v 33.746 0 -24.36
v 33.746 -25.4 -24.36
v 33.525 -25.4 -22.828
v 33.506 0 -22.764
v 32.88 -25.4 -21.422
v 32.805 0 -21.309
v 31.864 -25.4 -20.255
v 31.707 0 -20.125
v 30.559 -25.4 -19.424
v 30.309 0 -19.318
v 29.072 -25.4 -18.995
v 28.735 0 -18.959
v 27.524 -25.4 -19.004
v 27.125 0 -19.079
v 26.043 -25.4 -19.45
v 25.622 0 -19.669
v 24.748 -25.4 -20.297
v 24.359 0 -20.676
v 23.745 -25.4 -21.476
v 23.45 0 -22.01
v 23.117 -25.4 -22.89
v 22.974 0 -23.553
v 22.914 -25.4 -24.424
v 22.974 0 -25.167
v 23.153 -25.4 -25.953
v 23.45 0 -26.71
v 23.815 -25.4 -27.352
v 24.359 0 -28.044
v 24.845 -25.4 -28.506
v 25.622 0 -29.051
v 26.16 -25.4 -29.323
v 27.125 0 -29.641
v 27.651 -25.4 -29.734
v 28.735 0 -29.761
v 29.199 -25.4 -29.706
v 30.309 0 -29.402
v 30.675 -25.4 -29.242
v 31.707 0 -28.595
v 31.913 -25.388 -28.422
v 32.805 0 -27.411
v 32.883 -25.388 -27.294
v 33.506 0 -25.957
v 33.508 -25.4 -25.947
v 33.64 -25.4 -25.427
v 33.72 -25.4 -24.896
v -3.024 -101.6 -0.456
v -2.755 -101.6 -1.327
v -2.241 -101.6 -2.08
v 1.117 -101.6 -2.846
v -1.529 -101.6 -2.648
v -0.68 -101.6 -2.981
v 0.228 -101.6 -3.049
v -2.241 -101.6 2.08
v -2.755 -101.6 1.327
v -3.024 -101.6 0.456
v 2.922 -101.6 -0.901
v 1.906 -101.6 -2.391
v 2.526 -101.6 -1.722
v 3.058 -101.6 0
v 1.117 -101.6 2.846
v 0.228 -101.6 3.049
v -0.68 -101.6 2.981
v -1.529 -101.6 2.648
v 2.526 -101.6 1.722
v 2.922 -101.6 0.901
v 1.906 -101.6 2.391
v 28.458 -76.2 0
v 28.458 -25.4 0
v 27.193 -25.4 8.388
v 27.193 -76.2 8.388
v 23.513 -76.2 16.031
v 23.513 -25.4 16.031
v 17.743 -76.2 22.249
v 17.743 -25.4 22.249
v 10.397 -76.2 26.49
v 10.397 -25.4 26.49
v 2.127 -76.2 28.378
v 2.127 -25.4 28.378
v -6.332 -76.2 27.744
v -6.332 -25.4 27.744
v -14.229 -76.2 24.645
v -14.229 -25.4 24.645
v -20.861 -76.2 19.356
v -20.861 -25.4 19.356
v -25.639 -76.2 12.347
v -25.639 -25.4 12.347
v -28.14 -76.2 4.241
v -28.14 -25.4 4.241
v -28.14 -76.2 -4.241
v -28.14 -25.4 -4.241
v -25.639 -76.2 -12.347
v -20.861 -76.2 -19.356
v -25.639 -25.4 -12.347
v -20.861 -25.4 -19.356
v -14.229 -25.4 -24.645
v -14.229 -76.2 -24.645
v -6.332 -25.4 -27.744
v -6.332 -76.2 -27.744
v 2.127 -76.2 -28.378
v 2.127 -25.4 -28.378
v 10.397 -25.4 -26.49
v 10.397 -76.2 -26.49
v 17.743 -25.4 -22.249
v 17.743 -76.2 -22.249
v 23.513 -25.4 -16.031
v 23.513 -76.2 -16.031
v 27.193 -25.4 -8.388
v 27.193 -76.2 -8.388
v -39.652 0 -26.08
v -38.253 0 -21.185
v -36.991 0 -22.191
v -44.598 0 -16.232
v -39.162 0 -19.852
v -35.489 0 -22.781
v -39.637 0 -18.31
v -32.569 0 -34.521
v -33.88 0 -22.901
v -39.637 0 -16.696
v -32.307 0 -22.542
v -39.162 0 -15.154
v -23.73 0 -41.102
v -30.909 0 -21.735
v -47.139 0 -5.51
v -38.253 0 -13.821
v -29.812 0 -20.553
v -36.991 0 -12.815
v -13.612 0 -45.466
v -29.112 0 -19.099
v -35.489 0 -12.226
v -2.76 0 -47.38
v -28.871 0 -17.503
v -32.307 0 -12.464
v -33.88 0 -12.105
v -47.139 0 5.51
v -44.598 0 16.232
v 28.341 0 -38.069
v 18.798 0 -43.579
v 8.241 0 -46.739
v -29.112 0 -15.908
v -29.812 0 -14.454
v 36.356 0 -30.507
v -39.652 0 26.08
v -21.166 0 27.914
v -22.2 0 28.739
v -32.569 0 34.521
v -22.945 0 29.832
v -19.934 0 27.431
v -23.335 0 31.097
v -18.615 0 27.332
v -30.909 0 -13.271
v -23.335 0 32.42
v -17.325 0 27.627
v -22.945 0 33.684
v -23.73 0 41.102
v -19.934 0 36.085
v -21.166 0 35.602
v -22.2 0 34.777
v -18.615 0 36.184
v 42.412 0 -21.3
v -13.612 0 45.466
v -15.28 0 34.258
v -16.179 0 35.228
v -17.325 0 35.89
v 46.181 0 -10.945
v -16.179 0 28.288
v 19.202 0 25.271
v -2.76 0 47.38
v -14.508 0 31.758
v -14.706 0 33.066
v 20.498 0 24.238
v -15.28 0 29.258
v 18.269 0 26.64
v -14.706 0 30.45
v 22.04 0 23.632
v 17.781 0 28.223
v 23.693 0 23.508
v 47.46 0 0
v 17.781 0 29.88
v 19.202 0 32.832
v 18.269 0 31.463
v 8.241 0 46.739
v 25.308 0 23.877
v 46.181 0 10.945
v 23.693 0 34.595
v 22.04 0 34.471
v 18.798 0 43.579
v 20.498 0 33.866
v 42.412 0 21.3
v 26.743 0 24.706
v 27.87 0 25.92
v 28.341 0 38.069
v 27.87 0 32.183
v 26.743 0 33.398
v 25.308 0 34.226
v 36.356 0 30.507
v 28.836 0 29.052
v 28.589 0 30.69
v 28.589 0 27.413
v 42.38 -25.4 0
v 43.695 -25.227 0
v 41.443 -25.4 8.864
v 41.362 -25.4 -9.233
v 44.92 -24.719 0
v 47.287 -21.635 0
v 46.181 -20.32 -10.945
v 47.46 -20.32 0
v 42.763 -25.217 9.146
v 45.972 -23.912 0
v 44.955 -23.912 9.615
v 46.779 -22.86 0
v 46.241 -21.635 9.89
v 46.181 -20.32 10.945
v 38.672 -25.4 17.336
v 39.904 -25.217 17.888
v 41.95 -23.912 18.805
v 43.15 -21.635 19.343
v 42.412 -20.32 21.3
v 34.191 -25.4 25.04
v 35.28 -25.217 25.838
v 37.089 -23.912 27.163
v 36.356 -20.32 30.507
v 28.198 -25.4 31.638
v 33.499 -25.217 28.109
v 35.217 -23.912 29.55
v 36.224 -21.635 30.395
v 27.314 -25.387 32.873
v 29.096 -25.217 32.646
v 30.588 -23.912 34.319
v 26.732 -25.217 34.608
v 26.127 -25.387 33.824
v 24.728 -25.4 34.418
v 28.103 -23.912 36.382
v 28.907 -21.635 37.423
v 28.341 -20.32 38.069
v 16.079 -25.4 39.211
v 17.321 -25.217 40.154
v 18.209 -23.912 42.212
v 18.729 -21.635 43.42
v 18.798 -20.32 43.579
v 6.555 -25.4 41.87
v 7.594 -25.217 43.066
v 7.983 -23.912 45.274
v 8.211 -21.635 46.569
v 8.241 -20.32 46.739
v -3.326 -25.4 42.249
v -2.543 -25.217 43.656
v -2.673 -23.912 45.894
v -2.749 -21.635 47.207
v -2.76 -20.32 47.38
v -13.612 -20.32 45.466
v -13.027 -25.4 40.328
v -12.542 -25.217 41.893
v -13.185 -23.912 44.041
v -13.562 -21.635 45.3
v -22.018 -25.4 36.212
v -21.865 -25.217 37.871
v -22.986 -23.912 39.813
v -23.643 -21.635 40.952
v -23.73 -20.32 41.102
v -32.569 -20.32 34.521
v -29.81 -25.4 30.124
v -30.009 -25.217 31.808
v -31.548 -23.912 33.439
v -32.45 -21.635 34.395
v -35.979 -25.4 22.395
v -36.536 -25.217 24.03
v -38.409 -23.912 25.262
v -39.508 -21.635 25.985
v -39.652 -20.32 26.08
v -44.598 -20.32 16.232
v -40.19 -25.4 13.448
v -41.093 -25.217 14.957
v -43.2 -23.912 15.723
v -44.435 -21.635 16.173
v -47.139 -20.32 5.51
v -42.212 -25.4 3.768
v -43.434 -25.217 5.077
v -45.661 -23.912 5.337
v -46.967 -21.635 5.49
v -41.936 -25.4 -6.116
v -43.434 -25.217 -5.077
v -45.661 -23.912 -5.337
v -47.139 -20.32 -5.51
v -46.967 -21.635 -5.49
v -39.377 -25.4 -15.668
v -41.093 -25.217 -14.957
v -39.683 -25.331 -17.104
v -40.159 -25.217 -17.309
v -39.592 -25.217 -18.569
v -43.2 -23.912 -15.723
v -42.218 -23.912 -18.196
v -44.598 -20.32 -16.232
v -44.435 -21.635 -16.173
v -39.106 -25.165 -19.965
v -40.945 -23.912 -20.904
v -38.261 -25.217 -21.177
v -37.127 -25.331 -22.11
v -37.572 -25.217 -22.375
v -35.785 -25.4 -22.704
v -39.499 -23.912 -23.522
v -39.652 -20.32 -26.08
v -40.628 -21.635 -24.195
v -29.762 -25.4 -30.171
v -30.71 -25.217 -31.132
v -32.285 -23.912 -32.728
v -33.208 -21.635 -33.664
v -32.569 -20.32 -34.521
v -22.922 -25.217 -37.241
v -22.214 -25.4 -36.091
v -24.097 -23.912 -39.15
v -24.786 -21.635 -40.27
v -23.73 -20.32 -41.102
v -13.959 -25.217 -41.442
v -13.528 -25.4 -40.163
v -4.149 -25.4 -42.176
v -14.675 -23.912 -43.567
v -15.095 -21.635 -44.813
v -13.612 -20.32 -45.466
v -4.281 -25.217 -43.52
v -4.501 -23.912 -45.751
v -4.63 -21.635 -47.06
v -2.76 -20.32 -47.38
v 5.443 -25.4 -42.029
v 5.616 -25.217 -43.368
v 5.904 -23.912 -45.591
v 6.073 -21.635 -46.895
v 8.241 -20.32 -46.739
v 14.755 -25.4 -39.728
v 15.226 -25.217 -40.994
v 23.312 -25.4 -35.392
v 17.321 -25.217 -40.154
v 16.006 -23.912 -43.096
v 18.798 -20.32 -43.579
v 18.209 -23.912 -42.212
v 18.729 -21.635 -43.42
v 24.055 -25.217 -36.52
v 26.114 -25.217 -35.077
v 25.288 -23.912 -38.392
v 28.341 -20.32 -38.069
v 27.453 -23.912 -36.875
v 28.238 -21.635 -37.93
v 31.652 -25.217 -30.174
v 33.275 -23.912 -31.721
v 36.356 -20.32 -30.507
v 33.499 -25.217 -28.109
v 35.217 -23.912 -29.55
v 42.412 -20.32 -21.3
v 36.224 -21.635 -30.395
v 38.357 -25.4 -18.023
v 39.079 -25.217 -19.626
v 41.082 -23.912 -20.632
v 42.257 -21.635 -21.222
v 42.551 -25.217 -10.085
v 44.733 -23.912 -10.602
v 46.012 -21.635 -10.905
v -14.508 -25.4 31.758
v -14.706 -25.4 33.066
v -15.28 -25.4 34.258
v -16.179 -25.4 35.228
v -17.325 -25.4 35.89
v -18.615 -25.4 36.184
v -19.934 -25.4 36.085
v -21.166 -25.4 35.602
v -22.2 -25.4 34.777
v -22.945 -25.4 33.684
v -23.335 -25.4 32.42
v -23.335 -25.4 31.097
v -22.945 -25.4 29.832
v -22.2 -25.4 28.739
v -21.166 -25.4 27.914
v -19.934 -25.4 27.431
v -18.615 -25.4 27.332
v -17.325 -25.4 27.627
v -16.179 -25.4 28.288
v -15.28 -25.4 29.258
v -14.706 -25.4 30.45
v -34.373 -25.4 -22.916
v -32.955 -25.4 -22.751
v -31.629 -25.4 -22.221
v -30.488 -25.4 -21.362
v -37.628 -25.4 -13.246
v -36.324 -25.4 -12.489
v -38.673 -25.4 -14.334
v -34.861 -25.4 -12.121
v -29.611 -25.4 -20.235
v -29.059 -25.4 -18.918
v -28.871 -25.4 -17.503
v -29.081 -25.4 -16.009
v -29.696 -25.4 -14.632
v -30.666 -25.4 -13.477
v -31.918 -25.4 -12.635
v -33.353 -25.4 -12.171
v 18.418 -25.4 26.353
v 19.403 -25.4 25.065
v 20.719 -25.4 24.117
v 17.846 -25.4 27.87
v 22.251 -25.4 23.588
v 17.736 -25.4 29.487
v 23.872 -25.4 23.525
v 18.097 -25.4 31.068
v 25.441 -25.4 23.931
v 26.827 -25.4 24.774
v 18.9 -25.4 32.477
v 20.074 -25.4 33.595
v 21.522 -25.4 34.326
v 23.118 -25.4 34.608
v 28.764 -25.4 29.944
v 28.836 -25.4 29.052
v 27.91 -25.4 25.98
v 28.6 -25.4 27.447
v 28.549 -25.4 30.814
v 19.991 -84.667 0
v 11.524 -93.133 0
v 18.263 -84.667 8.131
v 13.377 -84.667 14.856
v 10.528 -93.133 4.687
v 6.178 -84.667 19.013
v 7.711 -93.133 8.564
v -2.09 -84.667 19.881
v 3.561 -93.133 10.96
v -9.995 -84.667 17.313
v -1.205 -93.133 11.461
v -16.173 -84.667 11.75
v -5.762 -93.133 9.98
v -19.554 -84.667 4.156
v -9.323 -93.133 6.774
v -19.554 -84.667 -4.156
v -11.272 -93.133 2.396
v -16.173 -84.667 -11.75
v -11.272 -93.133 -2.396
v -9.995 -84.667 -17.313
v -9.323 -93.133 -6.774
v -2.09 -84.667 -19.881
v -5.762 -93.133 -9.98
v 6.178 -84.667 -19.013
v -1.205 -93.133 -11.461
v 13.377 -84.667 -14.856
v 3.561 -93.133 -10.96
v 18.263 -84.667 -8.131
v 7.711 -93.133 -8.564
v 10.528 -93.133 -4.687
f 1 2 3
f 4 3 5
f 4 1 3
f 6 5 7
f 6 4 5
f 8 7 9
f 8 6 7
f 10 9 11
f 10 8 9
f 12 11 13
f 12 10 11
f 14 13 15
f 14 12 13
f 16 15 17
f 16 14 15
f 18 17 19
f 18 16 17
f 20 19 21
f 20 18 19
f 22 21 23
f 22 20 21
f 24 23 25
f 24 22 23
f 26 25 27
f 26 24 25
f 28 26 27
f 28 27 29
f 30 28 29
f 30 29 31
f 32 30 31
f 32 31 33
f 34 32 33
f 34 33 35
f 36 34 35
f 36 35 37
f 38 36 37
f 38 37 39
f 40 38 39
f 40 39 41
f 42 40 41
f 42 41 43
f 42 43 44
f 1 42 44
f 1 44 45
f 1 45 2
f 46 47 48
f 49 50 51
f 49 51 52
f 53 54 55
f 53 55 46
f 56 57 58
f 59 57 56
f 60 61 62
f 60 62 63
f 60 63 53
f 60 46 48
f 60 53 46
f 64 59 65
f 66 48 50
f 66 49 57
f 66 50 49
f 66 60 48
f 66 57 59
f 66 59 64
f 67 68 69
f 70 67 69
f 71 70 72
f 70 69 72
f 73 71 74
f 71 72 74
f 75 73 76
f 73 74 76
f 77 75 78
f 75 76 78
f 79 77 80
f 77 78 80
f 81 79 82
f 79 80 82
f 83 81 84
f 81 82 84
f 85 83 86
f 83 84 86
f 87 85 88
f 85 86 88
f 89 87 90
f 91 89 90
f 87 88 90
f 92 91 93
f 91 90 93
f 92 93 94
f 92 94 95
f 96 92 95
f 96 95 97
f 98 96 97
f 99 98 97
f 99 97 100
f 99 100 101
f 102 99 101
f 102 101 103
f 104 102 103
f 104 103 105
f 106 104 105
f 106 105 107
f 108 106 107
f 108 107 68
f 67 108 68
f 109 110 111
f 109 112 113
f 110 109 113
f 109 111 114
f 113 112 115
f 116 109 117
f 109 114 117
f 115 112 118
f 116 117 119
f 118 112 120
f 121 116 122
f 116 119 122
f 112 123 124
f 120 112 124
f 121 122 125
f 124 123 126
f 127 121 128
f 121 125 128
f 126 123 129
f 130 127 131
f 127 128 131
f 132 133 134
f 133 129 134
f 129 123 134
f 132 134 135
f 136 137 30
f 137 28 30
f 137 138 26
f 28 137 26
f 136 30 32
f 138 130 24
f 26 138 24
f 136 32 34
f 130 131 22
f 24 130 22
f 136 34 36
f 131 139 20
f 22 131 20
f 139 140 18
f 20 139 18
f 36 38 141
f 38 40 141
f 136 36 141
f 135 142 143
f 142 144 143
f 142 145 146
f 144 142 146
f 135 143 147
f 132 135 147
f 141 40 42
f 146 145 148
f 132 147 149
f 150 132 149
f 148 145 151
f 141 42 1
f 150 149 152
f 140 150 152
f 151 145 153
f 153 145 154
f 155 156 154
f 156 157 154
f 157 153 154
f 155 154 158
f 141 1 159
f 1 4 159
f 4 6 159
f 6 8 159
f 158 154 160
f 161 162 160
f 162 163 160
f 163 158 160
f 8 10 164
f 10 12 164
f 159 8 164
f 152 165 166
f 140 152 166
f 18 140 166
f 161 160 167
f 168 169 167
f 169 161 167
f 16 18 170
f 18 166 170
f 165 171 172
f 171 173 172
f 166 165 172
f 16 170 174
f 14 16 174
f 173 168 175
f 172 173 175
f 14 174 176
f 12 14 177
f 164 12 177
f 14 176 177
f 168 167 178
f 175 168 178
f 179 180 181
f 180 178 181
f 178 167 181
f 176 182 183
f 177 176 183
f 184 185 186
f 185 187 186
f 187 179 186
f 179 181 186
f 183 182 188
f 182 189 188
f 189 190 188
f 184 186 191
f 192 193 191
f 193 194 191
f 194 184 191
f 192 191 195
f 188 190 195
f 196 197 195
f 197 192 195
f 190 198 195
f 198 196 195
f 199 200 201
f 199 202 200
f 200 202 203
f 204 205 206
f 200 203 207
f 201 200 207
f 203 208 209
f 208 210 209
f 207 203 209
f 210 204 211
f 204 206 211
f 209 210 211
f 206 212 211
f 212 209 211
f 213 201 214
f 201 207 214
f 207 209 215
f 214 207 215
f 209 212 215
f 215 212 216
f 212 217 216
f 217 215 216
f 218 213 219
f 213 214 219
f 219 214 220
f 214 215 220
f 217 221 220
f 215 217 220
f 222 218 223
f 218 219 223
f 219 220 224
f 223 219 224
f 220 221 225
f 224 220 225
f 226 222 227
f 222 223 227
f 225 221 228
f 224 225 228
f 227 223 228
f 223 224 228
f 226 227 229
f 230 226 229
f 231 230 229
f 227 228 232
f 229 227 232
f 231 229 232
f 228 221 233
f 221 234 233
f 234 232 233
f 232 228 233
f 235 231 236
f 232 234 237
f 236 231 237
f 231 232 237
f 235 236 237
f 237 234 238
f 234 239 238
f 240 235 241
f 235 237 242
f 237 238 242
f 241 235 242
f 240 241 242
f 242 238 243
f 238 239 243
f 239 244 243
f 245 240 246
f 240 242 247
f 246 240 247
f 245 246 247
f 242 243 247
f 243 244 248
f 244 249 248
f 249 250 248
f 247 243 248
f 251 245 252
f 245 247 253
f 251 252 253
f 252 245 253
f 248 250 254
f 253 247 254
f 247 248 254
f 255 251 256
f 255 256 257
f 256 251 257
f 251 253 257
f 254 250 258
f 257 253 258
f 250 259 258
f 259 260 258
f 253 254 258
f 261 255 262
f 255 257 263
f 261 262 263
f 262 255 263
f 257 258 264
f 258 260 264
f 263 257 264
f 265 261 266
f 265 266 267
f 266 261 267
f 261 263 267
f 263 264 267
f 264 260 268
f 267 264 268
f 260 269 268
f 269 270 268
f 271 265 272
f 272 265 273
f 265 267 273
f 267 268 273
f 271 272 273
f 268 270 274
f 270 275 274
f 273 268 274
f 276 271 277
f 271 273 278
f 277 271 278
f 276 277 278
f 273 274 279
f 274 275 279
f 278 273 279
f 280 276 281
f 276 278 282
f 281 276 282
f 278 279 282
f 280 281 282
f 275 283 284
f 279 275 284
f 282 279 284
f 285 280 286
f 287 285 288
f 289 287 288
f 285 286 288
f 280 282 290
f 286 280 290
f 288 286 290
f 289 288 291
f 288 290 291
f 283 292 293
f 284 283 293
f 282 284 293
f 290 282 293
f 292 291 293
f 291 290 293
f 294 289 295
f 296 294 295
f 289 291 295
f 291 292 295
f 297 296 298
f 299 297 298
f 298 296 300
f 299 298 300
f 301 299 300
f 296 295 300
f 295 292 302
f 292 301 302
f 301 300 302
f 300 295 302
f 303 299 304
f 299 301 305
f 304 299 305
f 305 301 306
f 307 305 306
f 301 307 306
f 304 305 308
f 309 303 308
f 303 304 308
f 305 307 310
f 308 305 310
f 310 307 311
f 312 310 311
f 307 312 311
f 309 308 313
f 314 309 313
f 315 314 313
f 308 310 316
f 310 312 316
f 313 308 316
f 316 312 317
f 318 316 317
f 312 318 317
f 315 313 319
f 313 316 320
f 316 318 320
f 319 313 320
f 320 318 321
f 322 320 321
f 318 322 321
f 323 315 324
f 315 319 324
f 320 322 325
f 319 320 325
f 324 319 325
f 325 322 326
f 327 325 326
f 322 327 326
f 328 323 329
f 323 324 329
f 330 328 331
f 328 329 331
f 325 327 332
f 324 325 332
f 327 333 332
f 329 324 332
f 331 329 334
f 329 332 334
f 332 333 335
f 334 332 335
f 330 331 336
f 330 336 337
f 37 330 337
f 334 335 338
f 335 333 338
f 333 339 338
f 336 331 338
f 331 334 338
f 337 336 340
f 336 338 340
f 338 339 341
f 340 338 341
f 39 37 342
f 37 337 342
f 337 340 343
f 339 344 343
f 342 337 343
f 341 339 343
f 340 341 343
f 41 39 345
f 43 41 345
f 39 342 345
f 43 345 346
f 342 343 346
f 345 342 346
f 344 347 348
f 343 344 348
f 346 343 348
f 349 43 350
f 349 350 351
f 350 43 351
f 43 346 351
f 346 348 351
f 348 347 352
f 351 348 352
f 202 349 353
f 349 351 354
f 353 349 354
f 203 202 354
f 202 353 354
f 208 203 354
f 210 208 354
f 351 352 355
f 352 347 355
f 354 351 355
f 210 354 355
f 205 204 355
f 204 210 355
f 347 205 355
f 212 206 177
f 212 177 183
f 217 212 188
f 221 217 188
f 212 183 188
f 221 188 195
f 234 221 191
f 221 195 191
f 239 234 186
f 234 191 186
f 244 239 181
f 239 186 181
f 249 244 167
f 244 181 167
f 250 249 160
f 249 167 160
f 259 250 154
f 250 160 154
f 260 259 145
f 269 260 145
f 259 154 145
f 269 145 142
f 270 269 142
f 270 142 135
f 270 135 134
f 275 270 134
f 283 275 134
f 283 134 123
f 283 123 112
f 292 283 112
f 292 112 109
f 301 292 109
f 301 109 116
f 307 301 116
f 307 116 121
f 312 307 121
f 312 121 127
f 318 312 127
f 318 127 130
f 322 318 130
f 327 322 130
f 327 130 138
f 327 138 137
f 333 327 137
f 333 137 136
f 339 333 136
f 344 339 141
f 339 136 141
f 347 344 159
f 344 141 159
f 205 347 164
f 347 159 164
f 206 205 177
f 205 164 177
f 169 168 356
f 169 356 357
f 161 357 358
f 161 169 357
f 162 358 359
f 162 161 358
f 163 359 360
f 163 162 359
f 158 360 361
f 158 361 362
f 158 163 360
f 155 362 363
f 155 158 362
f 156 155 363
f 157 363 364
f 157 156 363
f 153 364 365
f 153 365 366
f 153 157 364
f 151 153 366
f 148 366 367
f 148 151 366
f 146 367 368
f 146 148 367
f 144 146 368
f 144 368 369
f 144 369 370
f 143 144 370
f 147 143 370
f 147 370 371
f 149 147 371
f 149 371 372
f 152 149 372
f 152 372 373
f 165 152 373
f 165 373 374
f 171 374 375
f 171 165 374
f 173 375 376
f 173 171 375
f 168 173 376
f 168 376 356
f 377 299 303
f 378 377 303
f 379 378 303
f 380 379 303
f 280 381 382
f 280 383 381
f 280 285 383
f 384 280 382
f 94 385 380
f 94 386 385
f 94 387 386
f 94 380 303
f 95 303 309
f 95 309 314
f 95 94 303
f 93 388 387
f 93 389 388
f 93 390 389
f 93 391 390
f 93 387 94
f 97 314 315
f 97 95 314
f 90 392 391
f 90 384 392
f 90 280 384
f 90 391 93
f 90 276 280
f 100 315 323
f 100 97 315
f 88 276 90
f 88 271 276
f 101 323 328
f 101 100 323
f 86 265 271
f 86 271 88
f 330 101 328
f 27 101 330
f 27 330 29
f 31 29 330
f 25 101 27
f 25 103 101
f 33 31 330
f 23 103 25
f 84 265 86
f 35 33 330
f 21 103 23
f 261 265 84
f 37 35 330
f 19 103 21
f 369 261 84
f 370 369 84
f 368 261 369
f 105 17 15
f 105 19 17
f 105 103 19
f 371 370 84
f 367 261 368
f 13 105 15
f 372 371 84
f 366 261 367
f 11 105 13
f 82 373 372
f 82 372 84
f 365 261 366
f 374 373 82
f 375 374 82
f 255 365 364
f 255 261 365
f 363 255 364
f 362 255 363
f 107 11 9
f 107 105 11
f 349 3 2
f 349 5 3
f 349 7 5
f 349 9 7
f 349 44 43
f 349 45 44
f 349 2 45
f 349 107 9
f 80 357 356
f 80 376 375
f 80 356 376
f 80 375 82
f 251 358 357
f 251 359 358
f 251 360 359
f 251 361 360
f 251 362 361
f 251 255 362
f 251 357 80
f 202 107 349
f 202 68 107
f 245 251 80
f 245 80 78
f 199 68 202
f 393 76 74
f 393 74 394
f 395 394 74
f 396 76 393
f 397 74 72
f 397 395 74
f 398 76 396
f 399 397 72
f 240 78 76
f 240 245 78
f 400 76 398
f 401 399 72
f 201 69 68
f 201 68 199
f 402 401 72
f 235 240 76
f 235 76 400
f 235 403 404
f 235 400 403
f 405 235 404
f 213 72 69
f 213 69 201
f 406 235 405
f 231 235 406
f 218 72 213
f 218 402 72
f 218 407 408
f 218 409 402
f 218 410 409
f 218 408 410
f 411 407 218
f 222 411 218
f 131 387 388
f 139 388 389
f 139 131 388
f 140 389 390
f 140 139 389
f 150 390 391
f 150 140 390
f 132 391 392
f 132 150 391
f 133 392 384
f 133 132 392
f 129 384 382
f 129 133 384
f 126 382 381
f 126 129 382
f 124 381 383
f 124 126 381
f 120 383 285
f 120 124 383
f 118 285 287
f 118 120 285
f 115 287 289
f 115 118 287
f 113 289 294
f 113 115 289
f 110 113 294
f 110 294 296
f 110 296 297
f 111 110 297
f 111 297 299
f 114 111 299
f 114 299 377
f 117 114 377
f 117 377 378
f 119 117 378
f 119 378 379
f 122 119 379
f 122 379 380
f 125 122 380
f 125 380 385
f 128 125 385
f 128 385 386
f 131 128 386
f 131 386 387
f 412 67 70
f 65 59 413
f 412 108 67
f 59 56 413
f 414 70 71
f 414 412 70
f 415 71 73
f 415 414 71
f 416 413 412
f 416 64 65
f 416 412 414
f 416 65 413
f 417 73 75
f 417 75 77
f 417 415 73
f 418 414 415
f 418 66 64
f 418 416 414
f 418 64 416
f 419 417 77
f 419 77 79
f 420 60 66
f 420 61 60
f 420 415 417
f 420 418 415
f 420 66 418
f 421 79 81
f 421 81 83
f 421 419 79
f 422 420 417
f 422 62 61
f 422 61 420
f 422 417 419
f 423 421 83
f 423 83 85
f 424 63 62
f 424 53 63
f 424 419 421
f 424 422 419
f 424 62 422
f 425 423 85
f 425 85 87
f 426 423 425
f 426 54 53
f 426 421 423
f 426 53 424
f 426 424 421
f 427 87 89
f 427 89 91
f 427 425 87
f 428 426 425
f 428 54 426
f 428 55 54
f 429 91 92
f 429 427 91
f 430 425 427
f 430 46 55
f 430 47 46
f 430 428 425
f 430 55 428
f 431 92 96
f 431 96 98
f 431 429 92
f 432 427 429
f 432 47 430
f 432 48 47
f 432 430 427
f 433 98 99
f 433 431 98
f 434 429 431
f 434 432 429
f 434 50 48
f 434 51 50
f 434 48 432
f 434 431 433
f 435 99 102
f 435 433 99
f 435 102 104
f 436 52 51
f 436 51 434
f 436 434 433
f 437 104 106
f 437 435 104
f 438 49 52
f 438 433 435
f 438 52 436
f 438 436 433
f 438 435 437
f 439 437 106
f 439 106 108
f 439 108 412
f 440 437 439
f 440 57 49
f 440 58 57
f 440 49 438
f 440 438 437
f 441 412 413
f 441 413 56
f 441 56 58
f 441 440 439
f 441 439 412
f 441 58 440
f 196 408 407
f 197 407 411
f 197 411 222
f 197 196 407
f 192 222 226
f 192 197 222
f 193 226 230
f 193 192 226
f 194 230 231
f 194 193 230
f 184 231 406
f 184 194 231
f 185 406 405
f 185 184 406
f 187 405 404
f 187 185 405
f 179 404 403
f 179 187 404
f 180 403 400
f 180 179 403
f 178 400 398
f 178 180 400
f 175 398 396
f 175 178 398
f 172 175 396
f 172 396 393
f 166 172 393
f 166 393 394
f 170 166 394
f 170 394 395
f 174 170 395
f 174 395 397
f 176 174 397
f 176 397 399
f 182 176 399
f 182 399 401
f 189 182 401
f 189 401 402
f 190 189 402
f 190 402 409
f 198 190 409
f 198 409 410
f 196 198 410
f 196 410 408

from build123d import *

# Parameters (mm, degrees)
F0_R     = 47.4599930616
F0_R_2   = 5.4133355618
F0_R_3   = 5.4163453987
F0_R_4   = 4.4383518645
F0_R_5   = 28.344153959
F0_R_6   = 5.55874857
F1_DEPTH = 25.4
F2_R     = 28.4576632657
F3_DEPTH = 101.6
F4_SIZE  = 25.4


# Not quite as in the source:
# - a fillet or chamfer that OpenCascade refuses, or shapes differently, is made with other operations: its cross-section is extruded or revolved along the edge and cut away or added


with BuildPart() as f1:
    # F0 (on Front) → F1 (new body)
    with BuildSketch(Plane.XZ):
        Circle(F0_R)
        with Locations((-34.2844575644, -17.503157258)):
            Circle(F0_R_2, mode=Mode.SUBTRACT)
        with Locations((28.3297896385, -24.3600457907)):
            Circle(F0_R_3, mode=Mode.SUBTRACT)
        with Locations((-18.9466699958, 31.7582041025)):
            Circle(F0_R_4, mode=Mode.SUBTRACT)
        Circle(F0_R_5, mode=Mode.SUBTRACT)
        with Locations((23.2773423195, 29.0515273809)):
            Circle(F0_R_6, mode=Mode.SUBTRACT)
    extrude(amount=F1_DEPTH)

    # F2 (on Front) → F3 (join)
    with BuildSketch(Plane.XZ):
        Circle(F2_R)
    extrude(amount=F3_DEPTH)

    # F4
    f4_edges = [f1.edges().sort_by_distance(p)[0] for p in [
        (-28.457663, -101.6, 0),
    ]]
    chamfer(f4_edges, length=F4_SIZE)

    # F5: fillet of radius 5.08 on 1 edges, made by hand

    # F5_s1 → F5_t2 (revolve, cut)
    with BuildSketch(Plane.XY):
        with BuildLine():
            ThreePointArc((42.3799930616, -25.4), (45.9720955101, -23.9121024484), (47.4599930616, -20.32))
            Line((47.4599930616, -20.32), (47.4599930616, -25.4))
            Line((47.4599930616, -25.4), (42.3799930616, -25.4))
        make_face()
    revolve(axis=Axis((0, -25.4, 0), (0, -1, 0)), mode=Mode.SUBTRACT)


solid = f1.part
